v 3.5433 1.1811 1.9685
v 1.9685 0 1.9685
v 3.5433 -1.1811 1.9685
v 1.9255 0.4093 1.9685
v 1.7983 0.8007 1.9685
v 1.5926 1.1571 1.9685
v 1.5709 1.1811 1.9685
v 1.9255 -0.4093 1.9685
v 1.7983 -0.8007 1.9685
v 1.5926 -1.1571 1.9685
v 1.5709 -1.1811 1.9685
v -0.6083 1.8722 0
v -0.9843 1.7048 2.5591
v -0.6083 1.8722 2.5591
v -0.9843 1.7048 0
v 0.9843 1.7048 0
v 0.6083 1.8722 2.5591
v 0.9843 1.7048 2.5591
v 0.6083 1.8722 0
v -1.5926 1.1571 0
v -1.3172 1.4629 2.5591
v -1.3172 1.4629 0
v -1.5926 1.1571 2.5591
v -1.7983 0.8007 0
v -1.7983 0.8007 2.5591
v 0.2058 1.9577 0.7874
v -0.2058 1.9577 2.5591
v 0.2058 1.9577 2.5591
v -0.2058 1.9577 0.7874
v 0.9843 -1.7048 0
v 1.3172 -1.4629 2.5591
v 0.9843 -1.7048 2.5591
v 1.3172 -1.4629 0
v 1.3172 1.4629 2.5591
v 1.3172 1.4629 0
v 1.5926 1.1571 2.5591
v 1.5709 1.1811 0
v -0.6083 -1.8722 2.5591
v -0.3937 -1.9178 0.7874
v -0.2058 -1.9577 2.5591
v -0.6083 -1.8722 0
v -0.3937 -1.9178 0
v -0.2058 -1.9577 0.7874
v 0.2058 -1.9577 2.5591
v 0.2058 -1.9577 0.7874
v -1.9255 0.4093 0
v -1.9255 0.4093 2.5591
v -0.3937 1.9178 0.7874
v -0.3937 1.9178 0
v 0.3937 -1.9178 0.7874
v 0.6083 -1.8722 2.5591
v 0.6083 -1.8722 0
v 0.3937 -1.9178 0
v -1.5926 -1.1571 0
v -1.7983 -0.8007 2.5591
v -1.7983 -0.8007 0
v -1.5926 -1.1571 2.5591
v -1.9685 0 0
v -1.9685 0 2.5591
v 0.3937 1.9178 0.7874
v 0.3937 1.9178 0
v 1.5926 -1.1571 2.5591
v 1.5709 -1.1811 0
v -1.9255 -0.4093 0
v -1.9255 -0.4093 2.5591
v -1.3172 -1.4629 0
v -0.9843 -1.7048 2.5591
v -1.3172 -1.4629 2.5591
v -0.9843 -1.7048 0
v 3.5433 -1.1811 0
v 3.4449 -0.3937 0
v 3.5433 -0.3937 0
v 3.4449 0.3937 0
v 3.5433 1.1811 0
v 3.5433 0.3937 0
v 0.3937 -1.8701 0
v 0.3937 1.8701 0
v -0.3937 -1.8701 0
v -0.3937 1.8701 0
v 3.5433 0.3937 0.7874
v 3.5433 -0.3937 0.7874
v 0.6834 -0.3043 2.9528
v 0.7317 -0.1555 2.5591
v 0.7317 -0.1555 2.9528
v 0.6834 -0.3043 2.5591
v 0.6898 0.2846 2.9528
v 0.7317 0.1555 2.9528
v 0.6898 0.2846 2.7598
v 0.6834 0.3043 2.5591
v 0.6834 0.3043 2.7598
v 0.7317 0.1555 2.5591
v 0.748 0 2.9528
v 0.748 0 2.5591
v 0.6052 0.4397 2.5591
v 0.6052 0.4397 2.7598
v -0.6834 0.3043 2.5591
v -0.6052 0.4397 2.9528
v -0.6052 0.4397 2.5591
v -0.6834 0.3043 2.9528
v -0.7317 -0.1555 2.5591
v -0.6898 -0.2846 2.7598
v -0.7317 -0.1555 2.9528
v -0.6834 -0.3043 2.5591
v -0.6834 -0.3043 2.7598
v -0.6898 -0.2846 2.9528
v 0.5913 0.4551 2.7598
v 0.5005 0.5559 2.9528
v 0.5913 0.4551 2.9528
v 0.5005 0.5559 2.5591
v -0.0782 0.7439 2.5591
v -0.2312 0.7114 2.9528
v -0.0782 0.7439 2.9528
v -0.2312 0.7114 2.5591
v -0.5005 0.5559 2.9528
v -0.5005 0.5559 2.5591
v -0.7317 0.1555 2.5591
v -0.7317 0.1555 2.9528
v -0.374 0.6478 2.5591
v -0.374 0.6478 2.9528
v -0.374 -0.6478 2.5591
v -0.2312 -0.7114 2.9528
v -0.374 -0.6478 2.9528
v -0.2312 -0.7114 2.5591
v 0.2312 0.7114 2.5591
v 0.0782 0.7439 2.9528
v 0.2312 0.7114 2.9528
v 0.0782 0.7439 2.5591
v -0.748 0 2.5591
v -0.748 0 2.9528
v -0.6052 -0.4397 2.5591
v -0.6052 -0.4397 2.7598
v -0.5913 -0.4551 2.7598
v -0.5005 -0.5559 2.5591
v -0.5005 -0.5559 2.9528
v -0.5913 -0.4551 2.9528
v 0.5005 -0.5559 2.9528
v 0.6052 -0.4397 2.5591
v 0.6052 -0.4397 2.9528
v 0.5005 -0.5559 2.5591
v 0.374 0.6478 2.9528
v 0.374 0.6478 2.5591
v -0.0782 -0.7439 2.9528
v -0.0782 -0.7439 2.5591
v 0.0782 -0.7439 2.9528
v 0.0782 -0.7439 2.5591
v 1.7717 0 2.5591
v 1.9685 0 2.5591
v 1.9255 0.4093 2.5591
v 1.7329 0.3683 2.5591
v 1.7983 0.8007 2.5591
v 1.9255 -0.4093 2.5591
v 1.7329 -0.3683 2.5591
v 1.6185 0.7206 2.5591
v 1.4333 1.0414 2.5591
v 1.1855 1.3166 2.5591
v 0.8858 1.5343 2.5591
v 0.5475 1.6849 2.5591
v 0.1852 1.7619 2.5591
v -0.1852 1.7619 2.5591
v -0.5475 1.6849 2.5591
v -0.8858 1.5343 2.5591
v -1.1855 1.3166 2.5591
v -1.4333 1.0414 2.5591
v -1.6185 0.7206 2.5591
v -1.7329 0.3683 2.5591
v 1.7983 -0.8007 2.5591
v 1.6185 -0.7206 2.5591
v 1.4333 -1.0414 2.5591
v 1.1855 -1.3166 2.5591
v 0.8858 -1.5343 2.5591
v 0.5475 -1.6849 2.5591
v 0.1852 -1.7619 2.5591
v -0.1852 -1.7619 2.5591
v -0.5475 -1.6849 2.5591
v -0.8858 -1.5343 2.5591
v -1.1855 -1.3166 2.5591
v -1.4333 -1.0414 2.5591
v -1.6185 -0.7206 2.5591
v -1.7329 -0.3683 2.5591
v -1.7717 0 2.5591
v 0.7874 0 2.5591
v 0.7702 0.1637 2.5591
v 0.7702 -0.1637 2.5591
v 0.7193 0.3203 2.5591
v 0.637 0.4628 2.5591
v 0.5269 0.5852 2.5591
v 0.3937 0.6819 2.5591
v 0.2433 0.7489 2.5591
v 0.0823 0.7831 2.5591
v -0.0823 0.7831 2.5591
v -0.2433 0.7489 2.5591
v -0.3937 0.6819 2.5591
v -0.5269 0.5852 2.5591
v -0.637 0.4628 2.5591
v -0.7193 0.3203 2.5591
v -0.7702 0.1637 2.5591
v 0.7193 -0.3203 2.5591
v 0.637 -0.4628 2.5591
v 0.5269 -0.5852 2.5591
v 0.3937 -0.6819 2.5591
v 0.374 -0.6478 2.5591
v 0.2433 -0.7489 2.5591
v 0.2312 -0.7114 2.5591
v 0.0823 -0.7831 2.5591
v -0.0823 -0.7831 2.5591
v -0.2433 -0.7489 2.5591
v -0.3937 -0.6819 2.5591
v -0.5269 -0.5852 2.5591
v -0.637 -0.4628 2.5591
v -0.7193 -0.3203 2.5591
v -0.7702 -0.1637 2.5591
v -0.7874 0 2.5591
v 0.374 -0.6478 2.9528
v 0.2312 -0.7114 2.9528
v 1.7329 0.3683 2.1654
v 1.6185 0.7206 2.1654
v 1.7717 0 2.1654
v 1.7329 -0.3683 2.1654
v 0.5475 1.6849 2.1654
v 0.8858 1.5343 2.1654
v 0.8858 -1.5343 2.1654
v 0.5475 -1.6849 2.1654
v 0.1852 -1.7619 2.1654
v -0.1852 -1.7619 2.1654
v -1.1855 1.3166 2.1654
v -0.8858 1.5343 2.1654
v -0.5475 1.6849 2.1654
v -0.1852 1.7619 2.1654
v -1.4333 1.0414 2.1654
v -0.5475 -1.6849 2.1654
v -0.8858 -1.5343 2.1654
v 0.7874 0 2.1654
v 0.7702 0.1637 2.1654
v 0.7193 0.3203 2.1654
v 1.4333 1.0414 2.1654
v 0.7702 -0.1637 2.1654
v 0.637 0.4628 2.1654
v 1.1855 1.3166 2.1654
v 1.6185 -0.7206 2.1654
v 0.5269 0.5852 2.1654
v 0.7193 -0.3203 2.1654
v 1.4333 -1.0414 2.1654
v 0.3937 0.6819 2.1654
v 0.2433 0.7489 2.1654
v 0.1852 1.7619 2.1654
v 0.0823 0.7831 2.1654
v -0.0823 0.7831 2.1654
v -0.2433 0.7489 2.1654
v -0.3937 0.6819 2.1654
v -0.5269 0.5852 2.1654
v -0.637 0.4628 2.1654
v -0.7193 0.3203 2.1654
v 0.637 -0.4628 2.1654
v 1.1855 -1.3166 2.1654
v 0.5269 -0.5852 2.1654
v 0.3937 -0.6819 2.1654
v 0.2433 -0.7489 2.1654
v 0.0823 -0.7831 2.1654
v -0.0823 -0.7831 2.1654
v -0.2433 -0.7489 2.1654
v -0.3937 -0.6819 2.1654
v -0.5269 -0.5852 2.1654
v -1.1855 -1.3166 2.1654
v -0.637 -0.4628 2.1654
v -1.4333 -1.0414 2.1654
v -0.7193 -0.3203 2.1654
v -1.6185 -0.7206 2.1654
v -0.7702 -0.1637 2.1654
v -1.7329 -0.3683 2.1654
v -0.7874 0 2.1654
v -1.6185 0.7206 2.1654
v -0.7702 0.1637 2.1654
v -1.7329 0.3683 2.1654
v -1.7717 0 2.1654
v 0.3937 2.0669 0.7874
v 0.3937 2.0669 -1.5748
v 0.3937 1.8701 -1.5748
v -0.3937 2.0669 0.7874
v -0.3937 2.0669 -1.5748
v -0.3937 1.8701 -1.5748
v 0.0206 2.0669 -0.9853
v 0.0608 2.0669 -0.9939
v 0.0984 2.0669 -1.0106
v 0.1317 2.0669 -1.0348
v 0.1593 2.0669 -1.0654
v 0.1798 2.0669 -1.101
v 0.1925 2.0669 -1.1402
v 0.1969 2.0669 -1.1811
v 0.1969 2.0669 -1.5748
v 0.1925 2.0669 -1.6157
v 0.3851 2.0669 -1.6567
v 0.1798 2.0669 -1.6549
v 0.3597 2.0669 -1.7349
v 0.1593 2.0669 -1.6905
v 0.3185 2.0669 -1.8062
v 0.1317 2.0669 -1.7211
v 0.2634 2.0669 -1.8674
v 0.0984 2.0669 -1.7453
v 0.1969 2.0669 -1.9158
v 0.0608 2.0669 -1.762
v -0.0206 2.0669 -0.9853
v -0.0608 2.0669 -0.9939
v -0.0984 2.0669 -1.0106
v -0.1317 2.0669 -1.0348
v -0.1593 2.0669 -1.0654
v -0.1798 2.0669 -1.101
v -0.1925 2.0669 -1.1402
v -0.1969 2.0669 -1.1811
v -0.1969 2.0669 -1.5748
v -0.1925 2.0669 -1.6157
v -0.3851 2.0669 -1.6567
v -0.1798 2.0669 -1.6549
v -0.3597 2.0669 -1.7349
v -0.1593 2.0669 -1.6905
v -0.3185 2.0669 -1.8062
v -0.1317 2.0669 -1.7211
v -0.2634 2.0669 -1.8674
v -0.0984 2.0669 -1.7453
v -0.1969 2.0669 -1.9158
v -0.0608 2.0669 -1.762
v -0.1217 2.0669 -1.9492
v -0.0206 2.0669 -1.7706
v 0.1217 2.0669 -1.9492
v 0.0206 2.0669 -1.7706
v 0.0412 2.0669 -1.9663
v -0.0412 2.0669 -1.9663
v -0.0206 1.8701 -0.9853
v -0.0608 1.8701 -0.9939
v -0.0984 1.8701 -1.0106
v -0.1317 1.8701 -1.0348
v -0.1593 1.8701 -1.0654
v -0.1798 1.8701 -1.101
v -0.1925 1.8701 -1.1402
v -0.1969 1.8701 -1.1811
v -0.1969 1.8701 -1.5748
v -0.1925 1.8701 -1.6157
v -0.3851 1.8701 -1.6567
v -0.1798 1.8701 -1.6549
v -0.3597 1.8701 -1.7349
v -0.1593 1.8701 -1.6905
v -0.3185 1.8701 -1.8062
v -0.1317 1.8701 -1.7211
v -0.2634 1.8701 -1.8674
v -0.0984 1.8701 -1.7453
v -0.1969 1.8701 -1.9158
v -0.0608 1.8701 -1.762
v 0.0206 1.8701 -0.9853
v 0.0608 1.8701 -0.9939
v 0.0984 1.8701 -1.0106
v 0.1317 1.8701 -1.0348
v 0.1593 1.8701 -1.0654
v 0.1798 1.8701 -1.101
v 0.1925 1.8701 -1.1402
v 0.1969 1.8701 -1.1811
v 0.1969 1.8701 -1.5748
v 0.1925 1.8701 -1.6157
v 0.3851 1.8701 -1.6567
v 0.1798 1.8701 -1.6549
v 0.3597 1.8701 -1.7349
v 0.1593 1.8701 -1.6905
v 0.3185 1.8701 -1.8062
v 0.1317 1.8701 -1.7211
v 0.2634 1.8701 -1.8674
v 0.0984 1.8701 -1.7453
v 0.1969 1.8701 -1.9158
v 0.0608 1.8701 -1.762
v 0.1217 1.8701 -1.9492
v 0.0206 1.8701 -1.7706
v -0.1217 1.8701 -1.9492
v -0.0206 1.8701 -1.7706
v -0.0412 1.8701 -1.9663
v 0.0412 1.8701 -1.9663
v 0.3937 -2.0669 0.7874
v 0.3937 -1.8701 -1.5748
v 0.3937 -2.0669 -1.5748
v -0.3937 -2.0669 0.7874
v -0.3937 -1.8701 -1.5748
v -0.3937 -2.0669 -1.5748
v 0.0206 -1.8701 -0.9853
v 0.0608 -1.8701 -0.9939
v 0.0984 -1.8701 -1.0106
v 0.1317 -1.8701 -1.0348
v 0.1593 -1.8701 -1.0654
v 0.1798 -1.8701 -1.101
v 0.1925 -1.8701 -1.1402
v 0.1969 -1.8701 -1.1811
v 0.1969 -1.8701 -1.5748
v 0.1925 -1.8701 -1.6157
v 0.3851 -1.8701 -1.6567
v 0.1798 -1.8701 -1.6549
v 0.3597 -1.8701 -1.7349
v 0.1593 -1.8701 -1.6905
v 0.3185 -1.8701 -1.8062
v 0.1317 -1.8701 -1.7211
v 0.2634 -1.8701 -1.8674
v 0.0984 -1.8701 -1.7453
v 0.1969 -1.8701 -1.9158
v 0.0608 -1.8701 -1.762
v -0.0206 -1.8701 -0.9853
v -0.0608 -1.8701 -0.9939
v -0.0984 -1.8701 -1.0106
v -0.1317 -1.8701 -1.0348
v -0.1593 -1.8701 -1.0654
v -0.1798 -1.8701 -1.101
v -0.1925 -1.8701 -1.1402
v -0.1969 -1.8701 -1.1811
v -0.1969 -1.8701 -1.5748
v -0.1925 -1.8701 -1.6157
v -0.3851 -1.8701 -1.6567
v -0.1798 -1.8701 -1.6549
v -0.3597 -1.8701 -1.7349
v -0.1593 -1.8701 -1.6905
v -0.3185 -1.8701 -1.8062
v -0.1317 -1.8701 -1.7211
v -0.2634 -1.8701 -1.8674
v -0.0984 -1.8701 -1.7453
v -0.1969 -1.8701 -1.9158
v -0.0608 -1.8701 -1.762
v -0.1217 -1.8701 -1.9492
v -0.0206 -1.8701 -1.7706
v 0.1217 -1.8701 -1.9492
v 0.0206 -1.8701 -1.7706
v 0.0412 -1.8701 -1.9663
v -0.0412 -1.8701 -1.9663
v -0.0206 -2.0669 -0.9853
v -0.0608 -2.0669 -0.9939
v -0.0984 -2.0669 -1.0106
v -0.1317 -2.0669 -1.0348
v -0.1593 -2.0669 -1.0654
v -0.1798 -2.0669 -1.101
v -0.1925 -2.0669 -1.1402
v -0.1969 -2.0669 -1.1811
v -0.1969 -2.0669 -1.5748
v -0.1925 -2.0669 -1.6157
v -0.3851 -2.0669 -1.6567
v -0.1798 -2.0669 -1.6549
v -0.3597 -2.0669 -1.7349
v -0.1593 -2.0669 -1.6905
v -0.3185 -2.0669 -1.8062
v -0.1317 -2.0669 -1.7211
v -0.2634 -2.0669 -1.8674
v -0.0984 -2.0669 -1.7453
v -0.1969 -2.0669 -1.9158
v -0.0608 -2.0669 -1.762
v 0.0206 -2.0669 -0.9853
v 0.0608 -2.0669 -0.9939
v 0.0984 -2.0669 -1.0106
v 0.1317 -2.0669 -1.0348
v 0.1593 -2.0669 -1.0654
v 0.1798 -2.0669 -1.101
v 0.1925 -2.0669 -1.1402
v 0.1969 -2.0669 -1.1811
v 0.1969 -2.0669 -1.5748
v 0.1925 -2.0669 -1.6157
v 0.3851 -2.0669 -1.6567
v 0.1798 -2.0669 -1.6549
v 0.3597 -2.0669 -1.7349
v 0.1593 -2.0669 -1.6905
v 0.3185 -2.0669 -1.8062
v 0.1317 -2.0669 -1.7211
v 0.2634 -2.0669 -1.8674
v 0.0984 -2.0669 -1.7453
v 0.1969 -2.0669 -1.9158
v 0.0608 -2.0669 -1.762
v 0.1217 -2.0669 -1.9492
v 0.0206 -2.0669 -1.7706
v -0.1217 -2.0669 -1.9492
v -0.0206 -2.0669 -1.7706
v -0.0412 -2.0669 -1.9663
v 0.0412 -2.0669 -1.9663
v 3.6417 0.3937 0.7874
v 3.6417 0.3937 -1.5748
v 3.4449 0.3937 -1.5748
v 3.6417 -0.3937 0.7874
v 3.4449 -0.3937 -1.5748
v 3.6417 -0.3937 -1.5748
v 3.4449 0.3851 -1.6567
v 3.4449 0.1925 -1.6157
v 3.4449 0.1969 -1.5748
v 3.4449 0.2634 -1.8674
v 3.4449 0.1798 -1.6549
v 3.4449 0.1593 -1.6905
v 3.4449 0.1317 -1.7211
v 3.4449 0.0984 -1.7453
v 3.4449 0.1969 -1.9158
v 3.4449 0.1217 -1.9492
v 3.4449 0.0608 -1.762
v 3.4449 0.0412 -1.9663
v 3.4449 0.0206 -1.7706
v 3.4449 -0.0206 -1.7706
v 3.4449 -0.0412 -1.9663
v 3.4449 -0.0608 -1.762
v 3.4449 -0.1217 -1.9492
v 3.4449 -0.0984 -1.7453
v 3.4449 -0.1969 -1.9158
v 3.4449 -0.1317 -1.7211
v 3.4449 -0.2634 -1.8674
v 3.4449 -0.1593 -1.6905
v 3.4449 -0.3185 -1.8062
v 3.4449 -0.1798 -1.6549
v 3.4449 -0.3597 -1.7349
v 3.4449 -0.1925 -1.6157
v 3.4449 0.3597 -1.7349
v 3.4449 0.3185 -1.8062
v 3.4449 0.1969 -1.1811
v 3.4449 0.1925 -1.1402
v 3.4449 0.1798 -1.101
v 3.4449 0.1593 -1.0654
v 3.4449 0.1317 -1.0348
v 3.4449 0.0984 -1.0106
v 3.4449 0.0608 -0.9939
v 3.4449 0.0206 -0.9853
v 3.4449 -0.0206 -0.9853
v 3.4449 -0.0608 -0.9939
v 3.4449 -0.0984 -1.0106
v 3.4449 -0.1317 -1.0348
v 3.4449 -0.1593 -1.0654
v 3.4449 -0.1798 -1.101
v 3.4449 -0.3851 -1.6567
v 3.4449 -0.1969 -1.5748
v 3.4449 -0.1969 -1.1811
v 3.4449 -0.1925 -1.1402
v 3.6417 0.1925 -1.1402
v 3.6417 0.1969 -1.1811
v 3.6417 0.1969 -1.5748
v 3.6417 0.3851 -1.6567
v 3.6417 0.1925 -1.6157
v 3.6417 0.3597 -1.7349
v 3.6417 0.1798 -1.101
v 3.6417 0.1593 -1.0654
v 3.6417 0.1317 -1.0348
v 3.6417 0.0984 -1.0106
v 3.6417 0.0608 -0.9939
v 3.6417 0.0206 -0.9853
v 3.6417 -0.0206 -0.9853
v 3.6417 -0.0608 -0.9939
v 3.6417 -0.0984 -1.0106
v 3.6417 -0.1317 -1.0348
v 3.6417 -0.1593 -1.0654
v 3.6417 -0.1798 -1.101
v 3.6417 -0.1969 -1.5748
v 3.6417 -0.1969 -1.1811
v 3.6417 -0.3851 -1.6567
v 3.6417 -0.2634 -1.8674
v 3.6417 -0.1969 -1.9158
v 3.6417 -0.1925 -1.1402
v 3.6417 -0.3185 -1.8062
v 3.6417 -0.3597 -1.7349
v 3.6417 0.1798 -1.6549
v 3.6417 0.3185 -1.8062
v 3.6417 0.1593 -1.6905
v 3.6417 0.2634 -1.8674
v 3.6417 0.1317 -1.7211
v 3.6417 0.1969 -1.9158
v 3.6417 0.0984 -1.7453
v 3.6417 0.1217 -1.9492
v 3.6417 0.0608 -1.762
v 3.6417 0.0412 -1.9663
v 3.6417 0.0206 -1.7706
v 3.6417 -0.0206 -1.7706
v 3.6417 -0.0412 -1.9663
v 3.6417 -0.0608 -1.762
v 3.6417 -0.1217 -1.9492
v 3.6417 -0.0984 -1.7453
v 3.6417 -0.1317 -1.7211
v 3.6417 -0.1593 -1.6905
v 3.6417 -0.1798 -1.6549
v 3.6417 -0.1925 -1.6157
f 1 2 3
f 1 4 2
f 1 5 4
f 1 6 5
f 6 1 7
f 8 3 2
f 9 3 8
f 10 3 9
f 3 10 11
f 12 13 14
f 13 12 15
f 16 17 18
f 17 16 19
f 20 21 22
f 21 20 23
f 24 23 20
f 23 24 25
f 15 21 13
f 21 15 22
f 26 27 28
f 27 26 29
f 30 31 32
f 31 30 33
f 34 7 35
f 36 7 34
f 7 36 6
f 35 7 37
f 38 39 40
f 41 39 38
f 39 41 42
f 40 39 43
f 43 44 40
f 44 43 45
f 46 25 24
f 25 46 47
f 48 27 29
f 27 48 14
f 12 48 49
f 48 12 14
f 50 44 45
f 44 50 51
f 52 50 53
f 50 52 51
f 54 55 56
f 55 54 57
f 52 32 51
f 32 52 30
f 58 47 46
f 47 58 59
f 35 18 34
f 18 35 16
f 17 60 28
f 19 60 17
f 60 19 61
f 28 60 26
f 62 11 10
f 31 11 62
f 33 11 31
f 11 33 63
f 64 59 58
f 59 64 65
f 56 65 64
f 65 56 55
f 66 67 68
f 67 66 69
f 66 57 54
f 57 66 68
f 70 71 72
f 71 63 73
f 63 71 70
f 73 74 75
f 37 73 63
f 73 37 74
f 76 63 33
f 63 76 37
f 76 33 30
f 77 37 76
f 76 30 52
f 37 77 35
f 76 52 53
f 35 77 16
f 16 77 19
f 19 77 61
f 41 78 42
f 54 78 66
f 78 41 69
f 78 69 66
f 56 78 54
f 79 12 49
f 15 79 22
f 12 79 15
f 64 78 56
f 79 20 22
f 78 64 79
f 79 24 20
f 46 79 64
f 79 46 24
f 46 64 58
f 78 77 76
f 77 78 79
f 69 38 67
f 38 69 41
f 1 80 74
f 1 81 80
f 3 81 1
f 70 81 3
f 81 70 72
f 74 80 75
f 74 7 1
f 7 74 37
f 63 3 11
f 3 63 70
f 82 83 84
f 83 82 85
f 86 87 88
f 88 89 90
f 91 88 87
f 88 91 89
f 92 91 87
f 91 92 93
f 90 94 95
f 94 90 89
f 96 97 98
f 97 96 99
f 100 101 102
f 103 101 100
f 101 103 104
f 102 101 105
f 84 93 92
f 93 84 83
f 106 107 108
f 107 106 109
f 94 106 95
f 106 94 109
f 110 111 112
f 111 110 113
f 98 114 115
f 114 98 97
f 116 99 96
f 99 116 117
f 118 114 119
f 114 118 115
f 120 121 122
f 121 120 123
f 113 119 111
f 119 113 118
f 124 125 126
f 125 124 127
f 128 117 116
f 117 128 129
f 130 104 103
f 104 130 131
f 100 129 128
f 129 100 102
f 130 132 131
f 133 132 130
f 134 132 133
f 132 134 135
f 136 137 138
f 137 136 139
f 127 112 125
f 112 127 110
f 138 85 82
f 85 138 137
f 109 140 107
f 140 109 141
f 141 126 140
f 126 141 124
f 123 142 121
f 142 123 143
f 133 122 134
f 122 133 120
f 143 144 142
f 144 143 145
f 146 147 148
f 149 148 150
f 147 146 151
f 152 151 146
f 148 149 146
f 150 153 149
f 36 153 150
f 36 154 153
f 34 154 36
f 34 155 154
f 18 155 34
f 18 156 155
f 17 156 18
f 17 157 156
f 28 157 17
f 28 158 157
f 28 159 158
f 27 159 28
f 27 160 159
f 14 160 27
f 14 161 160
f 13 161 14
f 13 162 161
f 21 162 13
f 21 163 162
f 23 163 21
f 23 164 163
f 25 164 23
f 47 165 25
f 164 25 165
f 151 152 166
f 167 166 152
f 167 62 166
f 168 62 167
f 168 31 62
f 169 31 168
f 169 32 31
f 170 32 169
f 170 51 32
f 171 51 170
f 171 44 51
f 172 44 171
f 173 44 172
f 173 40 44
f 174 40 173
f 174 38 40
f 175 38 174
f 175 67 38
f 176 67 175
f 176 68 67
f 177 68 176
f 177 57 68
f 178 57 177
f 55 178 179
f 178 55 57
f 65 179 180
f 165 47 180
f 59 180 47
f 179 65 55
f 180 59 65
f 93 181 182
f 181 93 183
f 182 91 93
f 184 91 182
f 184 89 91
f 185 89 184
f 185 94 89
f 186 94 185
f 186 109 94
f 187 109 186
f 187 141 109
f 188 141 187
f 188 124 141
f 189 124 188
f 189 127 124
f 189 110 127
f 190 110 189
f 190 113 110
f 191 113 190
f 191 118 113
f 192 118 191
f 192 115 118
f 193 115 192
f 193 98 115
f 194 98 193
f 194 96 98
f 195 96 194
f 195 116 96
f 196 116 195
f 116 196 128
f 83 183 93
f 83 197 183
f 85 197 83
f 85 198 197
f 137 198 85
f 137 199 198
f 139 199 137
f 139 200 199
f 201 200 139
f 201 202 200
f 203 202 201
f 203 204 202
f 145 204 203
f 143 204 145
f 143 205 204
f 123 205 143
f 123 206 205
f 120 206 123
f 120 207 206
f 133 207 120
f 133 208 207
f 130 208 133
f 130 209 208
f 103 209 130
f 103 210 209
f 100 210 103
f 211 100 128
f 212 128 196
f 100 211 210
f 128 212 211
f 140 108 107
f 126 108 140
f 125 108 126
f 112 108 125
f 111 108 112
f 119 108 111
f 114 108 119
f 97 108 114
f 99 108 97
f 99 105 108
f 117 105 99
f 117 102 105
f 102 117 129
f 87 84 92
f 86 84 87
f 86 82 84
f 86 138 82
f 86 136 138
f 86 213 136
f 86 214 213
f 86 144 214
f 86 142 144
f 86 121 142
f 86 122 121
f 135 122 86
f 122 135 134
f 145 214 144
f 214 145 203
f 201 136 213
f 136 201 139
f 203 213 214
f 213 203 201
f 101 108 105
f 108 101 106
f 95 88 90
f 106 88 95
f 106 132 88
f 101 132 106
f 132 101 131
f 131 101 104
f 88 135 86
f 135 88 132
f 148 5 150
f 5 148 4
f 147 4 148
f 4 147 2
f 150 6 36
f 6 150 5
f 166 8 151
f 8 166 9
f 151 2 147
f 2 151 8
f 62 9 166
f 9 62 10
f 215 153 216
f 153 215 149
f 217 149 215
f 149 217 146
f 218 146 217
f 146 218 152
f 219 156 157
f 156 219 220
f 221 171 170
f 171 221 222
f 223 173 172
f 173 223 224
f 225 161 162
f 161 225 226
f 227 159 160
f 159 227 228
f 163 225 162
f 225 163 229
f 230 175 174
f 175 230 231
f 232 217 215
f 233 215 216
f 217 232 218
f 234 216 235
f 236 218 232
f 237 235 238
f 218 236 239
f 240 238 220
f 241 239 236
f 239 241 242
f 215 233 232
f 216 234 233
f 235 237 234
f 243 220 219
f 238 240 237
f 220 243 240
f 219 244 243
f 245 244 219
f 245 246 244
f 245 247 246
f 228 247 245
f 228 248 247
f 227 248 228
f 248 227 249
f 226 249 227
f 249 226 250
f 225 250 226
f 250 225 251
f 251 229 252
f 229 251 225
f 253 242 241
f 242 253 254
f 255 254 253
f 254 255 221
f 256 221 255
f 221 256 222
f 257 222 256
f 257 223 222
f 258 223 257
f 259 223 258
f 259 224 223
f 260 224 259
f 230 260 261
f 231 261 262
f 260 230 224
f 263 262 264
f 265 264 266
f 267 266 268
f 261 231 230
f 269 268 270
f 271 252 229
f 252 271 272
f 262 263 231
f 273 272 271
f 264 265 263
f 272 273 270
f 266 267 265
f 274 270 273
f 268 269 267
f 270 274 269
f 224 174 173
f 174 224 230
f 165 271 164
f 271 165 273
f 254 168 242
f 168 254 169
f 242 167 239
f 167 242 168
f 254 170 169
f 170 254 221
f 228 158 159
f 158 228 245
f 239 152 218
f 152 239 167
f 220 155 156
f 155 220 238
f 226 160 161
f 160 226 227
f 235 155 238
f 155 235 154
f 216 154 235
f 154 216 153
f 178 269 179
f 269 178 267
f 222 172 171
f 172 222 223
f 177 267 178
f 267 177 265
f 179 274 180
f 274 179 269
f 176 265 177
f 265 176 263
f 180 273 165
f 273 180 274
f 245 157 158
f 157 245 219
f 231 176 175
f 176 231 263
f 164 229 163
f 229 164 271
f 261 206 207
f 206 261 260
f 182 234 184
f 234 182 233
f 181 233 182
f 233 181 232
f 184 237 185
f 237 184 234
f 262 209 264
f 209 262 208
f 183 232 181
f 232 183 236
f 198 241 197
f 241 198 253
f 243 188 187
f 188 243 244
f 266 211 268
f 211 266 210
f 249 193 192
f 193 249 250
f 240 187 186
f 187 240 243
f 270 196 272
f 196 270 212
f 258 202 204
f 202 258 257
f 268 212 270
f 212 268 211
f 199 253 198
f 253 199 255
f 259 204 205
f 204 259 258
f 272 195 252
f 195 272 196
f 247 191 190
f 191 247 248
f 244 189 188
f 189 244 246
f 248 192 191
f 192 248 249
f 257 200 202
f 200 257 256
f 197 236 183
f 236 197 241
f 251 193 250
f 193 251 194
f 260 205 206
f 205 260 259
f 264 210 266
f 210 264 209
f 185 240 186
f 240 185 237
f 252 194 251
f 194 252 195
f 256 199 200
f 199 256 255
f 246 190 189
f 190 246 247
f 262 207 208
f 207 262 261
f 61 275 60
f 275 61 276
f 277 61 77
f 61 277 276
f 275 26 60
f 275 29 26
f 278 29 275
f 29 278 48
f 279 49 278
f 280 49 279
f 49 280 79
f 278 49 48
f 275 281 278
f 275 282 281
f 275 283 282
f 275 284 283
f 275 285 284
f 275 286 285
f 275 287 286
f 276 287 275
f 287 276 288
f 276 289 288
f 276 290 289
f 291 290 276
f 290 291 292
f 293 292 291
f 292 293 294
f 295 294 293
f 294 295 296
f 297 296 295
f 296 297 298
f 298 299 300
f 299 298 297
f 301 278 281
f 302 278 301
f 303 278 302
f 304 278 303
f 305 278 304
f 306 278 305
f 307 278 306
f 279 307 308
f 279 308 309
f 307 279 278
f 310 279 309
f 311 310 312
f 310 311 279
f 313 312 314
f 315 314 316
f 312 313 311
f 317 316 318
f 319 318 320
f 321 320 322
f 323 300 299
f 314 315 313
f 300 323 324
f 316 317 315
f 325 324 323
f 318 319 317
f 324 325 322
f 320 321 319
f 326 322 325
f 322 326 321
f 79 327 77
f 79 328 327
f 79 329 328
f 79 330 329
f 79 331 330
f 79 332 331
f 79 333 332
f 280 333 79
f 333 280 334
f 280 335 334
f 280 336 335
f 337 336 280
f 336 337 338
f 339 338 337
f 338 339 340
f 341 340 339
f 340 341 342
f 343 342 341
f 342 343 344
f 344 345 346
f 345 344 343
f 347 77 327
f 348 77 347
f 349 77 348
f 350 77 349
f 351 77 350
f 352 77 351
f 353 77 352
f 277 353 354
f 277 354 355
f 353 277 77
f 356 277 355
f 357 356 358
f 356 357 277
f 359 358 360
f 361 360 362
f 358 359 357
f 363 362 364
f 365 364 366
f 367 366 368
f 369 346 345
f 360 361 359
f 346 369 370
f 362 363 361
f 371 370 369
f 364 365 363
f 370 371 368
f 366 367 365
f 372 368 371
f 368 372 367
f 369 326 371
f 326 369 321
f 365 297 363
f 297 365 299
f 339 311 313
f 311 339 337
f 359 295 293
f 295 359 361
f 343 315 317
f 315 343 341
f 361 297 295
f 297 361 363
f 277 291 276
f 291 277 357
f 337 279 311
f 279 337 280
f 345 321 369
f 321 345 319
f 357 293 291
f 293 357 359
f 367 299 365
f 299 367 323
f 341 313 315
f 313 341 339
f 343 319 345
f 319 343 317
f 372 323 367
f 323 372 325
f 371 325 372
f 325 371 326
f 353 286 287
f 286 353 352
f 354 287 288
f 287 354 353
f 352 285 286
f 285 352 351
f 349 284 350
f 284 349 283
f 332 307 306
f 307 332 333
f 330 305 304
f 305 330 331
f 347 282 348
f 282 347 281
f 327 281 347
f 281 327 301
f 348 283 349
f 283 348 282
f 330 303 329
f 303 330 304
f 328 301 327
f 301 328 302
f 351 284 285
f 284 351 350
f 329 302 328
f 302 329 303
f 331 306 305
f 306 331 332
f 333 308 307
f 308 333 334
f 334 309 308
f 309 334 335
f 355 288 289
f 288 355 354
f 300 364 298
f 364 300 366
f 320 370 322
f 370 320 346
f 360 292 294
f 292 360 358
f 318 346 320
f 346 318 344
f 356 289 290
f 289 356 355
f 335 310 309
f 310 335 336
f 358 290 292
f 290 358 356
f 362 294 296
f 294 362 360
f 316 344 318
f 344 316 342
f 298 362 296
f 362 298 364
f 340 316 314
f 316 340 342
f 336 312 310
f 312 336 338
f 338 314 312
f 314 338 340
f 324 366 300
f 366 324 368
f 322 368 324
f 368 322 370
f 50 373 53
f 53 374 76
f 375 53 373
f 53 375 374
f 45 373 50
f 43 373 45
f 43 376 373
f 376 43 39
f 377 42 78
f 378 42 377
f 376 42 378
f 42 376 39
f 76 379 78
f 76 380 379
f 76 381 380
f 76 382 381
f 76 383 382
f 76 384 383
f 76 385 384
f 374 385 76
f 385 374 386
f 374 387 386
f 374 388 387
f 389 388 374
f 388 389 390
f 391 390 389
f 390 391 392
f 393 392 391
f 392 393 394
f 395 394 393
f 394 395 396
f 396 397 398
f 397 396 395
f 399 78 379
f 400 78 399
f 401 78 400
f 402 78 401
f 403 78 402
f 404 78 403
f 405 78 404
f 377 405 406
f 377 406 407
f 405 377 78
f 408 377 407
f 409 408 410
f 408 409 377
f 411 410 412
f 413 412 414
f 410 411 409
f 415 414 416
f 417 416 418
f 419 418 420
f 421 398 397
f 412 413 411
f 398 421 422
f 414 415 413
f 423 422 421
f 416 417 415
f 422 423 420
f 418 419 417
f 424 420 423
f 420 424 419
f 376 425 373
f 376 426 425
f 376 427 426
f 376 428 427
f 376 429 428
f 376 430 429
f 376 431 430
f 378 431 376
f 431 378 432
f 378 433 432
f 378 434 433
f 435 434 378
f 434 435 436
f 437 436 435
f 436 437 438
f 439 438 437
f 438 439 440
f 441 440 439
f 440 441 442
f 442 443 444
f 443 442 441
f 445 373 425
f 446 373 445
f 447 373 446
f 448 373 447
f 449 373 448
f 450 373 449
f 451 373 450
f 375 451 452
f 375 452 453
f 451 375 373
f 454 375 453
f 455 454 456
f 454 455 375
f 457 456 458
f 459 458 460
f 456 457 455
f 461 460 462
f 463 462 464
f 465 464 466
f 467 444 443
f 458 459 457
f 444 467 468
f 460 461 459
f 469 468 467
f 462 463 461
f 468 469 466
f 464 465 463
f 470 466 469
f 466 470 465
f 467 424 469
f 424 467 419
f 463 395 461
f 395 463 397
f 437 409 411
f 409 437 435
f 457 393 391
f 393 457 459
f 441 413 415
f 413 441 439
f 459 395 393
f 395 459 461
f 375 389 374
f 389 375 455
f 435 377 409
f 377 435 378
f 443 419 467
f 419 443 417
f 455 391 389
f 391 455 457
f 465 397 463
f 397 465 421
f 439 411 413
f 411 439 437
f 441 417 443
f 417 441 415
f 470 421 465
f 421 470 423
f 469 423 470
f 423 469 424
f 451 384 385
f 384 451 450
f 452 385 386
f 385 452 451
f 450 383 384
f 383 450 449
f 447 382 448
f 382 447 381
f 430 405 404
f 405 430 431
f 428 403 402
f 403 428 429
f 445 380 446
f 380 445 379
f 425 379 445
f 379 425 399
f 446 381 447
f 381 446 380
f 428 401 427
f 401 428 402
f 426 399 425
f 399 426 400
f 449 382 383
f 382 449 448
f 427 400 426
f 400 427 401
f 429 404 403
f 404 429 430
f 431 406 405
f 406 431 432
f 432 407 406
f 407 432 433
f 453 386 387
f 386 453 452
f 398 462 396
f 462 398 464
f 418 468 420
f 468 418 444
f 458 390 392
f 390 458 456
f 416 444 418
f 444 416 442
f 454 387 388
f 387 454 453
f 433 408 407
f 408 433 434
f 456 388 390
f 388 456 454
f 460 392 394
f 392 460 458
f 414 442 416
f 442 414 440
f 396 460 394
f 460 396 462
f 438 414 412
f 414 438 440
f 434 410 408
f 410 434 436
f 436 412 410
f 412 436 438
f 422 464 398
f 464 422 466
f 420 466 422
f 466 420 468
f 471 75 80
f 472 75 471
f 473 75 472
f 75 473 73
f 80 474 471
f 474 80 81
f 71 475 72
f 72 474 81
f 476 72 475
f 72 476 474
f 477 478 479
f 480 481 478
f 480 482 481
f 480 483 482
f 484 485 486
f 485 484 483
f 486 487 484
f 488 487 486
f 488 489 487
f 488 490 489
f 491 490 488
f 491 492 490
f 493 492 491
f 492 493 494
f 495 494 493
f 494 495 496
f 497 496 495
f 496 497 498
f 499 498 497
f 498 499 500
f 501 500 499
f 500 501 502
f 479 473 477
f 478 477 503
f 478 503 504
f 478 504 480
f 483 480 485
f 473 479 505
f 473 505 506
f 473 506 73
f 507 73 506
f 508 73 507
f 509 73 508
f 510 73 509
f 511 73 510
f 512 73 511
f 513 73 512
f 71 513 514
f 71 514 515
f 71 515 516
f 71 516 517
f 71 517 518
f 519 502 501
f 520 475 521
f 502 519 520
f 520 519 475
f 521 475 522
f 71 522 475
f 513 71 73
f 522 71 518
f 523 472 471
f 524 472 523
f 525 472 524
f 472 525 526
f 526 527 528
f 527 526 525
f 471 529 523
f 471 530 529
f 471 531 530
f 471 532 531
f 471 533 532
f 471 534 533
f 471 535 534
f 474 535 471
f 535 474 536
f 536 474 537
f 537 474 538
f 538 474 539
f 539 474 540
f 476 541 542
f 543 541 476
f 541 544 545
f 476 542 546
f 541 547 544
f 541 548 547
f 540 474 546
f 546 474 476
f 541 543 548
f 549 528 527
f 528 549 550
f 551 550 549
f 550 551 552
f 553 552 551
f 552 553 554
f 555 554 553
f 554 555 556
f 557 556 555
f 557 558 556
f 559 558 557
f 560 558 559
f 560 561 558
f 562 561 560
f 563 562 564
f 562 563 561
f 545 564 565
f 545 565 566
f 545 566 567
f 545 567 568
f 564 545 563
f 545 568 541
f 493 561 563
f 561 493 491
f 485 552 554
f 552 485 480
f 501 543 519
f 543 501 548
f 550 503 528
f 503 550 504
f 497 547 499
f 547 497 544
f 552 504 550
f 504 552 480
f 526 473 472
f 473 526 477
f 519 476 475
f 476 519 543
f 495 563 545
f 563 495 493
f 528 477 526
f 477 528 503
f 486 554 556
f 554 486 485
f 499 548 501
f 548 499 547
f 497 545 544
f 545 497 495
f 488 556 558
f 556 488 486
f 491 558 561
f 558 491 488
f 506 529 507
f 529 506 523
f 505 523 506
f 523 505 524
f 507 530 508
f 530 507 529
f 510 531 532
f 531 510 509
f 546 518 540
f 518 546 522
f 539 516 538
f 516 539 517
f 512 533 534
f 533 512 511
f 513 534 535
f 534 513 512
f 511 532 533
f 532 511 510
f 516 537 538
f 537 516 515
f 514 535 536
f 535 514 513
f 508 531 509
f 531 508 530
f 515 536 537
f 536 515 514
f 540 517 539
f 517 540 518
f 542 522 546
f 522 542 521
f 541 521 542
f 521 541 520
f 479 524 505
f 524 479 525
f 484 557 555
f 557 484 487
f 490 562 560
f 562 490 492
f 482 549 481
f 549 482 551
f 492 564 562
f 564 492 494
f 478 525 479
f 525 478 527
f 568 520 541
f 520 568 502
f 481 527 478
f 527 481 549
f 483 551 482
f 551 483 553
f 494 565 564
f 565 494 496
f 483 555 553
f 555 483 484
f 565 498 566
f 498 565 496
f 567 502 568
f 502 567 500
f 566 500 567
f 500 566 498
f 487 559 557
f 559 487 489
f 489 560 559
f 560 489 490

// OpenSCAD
$fs = 0.1;
underground = 2;

module pin() {
	w = 2;
	d = 0.5;
	h = 7;
	color("gray")
	translate([-w/2, -d/2, -h])
	difference() {
		union() {
			translate([0, 0, w/2])
			cube([w, d, h - w/2]);

			translate([w/2, d, w/2])
			rotate(a = 90, v = [1, 0, 0])
			cylinder(h = d, d = w);
		}

		union() {
			translate([w/2, d+0.1, w])
			rotate(a = 90, v = [1, 0, 0])
			cylinder(h = d + 0.2, d = w/2);

			translate([w/4, d+0.1, w/2])
			rotate(a = 90, v = [1, 0, 0])
			cube([w/2, w/2, d+0.2]);

			translate([w/2, d+0.1, w/2])
			rotate(a = 90, v = [1, 0, 0])
			cylinder(h = d + 0.2, d = w/2);
		}		
	}
}

module cvar(diameter, height) {
	_inch = 1/2.54;
	depth = diameter * 0.6;
	scale([_inch, _inch, _inch]) {
		color("white") union() {
			cylinder(h = height, d = diameter);

			translate([0, -depth / 2, 0])
			cube([diameter * 0.9, depth, height]);
		}
		difference() {
			union() {
				color("yellow") 
				translate([0, 0, height])
				cylinder(h = 1.5, d = diameter);

				// nut
				color("gray")
				translate([0, 0, height+1.5]) 
				difference() {
					cylinder(h = 1, d = 3.8);

					rotate(a = 30, v = [0, 0, 1])
					translate([-1.9, -0.25, 0.51])
					cube([3.8, 0.5, 1]);
				}
			}

			color("yellow")
			difference() {
				translate([0, 0, height+0.5])
				cylinder(h = 1.5, d = diameter * 0.9);

				translate([0, 0, height+0.5])
				cylinder(h = 1.5, d = 4);
			}
		}
		translate([0, diameter / 2, 2])
		pin();

		translate([0, -diameter / 2, 2])
		pin();

		translate([9, 0, 2])
		rotate(a = 90, v = [0, 0, 1])
		pin();
	}
}

cvar(10, 5);
